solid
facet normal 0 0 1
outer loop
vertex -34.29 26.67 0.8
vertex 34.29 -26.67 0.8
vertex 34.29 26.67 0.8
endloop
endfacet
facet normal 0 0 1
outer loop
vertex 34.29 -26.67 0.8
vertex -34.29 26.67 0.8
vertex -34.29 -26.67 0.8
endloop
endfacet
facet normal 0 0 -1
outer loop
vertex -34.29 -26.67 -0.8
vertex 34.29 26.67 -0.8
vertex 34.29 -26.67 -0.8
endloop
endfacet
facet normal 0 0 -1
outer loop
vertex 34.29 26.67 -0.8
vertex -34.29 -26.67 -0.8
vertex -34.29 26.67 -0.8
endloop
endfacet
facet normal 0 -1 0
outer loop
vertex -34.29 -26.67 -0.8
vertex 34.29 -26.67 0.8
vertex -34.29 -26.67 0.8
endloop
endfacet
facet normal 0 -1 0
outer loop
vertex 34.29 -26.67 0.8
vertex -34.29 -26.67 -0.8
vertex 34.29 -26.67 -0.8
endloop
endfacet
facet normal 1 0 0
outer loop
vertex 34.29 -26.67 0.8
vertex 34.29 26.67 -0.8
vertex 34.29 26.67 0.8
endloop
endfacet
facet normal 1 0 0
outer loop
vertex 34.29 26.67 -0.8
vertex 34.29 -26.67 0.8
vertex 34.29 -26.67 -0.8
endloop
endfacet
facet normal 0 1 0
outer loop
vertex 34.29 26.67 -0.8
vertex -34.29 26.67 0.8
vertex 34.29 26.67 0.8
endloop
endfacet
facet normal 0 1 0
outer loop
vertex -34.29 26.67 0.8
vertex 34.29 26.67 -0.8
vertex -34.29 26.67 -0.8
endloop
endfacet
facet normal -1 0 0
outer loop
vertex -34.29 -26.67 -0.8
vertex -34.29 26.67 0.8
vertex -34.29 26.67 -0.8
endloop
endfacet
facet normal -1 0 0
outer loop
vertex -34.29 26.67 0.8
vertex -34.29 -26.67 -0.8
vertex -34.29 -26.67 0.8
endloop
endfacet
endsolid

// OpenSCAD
translate([-68.58/2, -53.34/2, -1.6/2])
    cube([68.58, 53.34, 1.6]);
